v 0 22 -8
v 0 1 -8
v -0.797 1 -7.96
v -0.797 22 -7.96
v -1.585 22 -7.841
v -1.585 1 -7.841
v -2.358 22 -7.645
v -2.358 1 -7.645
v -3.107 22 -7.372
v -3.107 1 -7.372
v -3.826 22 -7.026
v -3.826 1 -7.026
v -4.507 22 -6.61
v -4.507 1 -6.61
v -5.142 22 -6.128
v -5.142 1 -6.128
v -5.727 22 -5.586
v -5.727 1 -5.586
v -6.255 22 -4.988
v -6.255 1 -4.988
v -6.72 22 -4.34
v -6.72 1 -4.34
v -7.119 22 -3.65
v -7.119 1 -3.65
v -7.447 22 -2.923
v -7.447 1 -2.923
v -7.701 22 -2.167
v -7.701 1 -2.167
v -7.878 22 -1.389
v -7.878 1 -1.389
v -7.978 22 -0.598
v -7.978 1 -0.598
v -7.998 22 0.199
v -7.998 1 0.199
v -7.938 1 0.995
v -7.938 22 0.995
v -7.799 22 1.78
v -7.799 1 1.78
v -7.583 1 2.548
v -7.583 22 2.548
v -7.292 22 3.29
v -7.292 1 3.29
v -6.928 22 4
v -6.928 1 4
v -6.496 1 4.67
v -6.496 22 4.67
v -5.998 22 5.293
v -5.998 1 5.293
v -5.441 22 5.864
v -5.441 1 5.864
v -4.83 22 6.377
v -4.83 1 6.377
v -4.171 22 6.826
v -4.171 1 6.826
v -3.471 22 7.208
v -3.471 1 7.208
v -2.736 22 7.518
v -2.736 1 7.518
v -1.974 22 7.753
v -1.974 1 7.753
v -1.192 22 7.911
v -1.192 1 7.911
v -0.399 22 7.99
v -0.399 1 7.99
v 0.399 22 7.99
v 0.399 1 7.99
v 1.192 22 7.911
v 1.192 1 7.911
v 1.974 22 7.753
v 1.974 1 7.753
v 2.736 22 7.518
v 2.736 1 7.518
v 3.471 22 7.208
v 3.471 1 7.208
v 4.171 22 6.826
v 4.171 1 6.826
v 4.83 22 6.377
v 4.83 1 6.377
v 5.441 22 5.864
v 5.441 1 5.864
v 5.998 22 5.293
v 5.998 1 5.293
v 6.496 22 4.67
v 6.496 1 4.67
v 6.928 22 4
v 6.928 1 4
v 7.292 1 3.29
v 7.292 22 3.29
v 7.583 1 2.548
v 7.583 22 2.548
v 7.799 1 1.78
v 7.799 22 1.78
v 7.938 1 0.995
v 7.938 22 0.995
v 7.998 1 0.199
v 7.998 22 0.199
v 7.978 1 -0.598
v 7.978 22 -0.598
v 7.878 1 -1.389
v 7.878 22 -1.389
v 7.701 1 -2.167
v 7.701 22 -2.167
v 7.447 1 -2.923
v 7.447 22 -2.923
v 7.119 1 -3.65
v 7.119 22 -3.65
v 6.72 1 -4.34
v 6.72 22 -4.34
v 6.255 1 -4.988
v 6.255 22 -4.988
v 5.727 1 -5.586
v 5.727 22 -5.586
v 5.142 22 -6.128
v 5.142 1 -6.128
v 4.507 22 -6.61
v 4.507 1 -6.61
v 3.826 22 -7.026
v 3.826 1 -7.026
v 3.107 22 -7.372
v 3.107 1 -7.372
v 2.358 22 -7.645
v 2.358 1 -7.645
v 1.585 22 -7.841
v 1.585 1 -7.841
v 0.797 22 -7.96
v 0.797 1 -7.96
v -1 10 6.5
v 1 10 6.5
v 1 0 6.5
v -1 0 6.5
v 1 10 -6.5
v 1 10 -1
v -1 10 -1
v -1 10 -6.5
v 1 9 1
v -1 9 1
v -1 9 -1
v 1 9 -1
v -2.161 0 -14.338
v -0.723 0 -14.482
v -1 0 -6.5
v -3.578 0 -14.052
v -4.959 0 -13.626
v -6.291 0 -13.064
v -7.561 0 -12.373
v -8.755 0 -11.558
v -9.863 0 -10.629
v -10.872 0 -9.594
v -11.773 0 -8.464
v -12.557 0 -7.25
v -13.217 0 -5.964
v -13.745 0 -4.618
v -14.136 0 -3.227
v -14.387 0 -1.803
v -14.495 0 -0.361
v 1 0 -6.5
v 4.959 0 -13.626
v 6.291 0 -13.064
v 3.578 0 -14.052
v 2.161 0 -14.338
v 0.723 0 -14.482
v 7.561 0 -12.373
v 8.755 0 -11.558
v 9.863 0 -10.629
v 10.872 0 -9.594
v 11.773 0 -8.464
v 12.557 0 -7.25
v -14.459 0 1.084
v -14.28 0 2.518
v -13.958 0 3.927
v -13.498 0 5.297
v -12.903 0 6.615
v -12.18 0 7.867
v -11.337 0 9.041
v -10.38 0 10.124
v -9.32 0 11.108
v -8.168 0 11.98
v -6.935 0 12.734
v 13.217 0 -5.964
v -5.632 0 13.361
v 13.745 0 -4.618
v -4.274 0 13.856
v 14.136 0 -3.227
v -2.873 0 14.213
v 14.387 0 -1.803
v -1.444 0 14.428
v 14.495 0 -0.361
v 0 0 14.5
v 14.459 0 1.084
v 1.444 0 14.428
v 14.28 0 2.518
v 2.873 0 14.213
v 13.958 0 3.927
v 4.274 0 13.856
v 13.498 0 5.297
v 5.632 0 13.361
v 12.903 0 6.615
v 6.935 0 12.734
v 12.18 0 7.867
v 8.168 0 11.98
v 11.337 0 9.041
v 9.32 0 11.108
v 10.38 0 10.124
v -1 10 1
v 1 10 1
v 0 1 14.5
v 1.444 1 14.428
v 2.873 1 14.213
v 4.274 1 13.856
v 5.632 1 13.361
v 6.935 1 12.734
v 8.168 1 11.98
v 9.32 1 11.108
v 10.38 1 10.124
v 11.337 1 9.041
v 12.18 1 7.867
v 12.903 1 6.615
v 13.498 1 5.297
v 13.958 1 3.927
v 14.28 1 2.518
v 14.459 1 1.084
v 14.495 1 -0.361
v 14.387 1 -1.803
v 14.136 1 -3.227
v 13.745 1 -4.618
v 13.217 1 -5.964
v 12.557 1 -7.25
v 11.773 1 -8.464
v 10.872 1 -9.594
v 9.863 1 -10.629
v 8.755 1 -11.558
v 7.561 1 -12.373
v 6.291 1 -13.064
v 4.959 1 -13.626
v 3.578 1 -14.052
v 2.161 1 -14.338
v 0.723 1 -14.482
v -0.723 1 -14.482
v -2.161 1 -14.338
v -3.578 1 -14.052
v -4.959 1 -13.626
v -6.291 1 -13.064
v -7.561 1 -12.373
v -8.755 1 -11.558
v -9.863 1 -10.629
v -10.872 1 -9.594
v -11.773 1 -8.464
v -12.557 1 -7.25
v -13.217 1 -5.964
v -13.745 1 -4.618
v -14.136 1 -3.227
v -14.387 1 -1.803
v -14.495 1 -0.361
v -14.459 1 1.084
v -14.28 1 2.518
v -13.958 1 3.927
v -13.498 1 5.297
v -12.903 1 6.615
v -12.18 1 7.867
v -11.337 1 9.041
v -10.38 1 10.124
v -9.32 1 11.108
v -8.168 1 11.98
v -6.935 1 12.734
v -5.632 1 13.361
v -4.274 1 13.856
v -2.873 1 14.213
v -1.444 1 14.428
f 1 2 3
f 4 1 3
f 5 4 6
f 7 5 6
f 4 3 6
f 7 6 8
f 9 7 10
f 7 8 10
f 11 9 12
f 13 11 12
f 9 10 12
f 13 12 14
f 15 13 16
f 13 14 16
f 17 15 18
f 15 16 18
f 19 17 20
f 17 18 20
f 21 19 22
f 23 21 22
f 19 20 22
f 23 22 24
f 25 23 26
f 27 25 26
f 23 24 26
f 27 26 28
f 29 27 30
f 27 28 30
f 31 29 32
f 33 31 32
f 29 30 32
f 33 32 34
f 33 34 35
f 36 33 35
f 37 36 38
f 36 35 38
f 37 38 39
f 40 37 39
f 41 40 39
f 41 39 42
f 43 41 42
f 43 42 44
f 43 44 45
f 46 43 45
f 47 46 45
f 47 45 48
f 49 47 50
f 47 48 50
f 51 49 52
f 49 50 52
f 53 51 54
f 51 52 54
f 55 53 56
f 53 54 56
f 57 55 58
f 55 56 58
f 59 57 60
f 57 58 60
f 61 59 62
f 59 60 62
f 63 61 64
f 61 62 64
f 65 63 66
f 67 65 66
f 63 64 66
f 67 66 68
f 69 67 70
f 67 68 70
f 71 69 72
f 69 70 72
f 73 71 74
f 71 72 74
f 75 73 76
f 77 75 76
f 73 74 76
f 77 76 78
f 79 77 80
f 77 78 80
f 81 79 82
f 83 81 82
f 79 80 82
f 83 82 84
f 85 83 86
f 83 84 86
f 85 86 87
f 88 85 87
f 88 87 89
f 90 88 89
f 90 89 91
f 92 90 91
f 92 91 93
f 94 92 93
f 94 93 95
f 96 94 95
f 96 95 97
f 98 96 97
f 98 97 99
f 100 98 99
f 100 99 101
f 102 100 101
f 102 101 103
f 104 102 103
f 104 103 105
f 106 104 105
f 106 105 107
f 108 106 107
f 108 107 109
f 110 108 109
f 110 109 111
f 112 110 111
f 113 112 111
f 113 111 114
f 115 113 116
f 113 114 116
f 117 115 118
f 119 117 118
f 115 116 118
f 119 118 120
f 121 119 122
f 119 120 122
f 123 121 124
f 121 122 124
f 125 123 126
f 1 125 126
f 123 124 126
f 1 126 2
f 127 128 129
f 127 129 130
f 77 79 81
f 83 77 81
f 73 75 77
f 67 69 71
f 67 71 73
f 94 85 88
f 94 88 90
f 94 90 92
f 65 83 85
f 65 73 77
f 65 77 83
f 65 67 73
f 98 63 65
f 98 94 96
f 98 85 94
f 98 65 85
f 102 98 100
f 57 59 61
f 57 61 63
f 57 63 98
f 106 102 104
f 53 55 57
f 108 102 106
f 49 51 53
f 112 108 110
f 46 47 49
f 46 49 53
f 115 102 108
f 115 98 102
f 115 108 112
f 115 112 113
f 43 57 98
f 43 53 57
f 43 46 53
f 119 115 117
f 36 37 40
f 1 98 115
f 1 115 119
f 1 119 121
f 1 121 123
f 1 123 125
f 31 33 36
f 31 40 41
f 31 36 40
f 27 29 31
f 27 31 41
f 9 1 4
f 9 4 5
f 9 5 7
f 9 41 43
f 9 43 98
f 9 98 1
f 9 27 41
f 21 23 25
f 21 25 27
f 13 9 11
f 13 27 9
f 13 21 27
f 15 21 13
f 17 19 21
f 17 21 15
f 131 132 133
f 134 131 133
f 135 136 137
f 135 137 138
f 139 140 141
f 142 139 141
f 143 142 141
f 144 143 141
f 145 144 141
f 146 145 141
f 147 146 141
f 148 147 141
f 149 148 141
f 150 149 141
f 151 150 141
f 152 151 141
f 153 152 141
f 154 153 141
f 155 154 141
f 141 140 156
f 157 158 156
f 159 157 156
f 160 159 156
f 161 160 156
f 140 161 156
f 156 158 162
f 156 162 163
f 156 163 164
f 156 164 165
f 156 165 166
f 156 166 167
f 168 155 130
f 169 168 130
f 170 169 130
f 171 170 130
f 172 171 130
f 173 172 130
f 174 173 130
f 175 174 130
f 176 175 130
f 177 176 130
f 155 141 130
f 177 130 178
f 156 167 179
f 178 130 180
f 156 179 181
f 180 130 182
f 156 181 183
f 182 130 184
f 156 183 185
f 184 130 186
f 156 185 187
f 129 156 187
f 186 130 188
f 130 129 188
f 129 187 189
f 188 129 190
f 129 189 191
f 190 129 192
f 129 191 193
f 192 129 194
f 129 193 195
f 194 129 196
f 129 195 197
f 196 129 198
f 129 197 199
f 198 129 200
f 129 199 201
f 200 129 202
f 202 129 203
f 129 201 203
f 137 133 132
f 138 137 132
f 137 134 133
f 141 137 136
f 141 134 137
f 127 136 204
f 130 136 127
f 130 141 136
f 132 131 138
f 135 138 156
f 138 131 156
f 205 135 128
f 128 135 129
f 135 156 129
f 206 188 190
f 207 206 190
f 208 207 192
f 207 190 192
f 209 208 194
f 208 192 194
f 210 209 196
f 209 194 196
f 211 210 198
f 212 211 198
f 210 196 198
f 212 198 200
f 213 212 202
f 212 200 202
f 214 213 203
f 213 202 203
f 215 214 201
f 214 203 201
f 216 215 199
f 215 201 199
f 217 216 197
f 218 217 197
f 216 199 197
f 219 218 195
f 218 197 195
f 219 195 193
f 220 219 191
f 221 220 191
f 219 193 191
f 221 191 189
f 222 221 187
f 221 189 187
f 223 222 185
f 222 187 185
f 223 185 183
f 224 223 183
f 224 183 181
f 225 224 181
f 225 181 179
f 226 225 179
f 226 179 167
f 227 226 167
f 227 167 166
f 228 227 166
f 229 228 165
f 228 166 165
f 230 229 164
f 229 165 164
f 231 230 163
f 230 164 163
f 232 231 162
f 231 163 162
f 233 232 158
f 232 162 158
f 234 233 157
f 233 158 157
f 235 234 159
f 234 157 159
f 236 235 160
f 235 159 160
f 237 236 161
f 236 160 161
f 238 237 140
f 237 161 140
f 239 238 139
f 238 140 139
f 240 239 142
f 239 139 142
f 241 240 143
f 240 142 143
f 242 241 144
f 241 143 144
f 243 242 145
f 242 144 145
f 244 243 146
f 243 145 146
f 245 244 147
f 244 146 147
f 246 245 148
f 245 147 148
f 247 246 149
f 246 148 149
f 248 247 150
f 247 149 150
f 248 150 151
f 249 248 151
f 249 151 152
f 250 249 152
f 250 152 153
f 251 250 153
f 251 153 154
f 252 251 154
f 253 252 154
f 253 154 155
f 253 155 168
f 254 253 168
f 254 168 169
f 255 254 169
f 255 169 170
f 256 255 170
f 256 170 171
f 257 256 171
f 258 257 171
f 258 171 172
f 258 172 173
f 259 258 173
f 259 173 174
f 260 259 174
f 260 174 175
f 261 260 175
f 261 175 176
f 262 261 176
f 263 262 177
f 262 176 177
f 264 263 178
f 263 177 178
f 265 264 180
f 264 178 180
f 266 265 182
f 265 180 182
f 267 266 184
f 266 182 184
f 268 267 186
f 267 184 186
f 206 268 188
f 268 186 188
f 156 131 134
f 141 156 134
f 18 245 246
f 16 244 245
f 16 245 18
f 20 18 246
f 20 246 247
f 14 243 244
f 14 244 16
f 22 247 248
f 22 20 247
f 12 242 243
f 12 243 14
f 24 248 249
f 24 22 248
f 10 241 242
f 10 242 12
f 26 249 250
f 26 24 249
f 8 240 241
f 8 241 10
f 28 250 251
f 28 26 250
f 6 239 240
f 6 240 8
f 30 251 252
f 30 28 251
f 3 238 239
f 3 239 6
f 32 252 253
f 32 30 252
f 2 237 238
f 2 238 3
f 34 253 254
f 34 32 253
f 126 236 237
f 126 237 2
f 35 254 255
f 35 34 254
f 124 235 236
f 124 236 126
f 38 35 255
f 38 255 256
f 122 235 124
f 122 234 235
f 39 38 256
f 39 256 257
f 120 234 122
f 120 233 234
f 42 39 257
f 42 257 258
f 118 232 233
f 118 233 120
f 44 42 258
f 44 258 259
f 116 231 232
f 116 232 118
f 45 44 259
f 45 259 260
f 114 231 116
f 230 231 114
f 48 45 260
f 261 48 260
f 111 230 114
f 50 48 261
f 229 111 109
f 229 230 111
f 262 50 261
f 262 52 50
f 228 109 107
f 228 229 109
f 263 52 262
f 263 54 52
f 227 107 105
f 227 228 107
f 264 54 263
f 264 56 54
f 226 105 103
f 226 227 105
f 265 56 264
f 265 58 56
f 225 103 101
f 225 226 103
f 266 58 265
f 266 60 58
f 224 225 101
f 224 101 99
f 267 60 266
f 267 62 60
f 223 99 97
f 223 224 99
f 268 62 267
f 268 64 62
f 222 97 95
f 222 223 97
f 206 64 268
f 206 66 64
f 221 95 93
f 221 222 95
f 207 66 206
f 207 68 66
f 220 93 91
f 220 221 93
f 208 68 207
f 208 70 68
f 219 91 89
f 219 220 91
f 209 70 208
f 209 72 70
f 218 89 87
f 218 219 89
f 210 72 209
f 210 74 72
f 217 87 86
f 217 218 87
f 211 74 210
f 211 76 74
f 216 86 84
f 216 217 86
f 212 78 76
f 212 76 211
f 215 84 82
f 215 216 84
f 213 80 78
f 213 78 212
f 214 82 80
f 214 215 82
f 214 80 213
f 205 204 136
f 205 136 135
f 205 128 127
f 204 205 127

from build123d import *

# Parameters (mm, degrees)
SKETCH_1_R          = 14.5
EXTRUDE_1_DEPTH     = 1
SKETCH_3_R          = 8
EXTRUDE_3_DEPTH     = 21
SKETCH_4_W          = 2
SKETCH_4_H          = 13
CUT_EXTRUDE_1_DEPTH = 10
SKETCH_5_W          = 2
SKETCH_5_H          = 2
EXTRUDE_4_DEPTH     = 1


with BuildPart() as part:
    # 草图1 → 拉伸1 (new body)
    with BuildSketch(Plane(origin=(0, 0, 0), x_dir=(1, 0, 0), z_dir=(0, 1, 0))):
        with Locations(Location((0, 0, 0), (0, 0, 270))):
            Circle(SKETCH_1_R)
    extrude(amount=EXTRUDE_1_DEPTH)

    # 草图3 → 拉伸3 (add)
    with BuildSketch(Plane(origin=(0, 1, 0), x_dir=(-1, 0, 0), z_dir=(0, 1, 0))):
        with Locations(Location((0, 0, 0), (0, 0, 270))):
            Circle(SKETCH_3_R)
    extrude(amount=EXTRUDE_3_DEPTH)

    # 草图4 → 切除-拉伸1 (cut)
    with BuildSketch(Plane(origin=(0, 0, 0), x_dir=(-1, 0, 0), z_dir=(0, 1, 0))):
        Rectangle(SKETCH_4_W, SKETCH_4_H)
    extrude(amount=CUT_EXTRUDE_1_DEPTH, mode=Mode.SUBTRACT)

    # 草图5 → 拉伸4 (add)
    with BuildSketch(Plane.XZ.offset(-10)):
        Rectangle(SKETCH_5_W, SKETCH_5_H)
    extrude(amount=EXTRUDE_4_DEPTH)


solid = part.part
